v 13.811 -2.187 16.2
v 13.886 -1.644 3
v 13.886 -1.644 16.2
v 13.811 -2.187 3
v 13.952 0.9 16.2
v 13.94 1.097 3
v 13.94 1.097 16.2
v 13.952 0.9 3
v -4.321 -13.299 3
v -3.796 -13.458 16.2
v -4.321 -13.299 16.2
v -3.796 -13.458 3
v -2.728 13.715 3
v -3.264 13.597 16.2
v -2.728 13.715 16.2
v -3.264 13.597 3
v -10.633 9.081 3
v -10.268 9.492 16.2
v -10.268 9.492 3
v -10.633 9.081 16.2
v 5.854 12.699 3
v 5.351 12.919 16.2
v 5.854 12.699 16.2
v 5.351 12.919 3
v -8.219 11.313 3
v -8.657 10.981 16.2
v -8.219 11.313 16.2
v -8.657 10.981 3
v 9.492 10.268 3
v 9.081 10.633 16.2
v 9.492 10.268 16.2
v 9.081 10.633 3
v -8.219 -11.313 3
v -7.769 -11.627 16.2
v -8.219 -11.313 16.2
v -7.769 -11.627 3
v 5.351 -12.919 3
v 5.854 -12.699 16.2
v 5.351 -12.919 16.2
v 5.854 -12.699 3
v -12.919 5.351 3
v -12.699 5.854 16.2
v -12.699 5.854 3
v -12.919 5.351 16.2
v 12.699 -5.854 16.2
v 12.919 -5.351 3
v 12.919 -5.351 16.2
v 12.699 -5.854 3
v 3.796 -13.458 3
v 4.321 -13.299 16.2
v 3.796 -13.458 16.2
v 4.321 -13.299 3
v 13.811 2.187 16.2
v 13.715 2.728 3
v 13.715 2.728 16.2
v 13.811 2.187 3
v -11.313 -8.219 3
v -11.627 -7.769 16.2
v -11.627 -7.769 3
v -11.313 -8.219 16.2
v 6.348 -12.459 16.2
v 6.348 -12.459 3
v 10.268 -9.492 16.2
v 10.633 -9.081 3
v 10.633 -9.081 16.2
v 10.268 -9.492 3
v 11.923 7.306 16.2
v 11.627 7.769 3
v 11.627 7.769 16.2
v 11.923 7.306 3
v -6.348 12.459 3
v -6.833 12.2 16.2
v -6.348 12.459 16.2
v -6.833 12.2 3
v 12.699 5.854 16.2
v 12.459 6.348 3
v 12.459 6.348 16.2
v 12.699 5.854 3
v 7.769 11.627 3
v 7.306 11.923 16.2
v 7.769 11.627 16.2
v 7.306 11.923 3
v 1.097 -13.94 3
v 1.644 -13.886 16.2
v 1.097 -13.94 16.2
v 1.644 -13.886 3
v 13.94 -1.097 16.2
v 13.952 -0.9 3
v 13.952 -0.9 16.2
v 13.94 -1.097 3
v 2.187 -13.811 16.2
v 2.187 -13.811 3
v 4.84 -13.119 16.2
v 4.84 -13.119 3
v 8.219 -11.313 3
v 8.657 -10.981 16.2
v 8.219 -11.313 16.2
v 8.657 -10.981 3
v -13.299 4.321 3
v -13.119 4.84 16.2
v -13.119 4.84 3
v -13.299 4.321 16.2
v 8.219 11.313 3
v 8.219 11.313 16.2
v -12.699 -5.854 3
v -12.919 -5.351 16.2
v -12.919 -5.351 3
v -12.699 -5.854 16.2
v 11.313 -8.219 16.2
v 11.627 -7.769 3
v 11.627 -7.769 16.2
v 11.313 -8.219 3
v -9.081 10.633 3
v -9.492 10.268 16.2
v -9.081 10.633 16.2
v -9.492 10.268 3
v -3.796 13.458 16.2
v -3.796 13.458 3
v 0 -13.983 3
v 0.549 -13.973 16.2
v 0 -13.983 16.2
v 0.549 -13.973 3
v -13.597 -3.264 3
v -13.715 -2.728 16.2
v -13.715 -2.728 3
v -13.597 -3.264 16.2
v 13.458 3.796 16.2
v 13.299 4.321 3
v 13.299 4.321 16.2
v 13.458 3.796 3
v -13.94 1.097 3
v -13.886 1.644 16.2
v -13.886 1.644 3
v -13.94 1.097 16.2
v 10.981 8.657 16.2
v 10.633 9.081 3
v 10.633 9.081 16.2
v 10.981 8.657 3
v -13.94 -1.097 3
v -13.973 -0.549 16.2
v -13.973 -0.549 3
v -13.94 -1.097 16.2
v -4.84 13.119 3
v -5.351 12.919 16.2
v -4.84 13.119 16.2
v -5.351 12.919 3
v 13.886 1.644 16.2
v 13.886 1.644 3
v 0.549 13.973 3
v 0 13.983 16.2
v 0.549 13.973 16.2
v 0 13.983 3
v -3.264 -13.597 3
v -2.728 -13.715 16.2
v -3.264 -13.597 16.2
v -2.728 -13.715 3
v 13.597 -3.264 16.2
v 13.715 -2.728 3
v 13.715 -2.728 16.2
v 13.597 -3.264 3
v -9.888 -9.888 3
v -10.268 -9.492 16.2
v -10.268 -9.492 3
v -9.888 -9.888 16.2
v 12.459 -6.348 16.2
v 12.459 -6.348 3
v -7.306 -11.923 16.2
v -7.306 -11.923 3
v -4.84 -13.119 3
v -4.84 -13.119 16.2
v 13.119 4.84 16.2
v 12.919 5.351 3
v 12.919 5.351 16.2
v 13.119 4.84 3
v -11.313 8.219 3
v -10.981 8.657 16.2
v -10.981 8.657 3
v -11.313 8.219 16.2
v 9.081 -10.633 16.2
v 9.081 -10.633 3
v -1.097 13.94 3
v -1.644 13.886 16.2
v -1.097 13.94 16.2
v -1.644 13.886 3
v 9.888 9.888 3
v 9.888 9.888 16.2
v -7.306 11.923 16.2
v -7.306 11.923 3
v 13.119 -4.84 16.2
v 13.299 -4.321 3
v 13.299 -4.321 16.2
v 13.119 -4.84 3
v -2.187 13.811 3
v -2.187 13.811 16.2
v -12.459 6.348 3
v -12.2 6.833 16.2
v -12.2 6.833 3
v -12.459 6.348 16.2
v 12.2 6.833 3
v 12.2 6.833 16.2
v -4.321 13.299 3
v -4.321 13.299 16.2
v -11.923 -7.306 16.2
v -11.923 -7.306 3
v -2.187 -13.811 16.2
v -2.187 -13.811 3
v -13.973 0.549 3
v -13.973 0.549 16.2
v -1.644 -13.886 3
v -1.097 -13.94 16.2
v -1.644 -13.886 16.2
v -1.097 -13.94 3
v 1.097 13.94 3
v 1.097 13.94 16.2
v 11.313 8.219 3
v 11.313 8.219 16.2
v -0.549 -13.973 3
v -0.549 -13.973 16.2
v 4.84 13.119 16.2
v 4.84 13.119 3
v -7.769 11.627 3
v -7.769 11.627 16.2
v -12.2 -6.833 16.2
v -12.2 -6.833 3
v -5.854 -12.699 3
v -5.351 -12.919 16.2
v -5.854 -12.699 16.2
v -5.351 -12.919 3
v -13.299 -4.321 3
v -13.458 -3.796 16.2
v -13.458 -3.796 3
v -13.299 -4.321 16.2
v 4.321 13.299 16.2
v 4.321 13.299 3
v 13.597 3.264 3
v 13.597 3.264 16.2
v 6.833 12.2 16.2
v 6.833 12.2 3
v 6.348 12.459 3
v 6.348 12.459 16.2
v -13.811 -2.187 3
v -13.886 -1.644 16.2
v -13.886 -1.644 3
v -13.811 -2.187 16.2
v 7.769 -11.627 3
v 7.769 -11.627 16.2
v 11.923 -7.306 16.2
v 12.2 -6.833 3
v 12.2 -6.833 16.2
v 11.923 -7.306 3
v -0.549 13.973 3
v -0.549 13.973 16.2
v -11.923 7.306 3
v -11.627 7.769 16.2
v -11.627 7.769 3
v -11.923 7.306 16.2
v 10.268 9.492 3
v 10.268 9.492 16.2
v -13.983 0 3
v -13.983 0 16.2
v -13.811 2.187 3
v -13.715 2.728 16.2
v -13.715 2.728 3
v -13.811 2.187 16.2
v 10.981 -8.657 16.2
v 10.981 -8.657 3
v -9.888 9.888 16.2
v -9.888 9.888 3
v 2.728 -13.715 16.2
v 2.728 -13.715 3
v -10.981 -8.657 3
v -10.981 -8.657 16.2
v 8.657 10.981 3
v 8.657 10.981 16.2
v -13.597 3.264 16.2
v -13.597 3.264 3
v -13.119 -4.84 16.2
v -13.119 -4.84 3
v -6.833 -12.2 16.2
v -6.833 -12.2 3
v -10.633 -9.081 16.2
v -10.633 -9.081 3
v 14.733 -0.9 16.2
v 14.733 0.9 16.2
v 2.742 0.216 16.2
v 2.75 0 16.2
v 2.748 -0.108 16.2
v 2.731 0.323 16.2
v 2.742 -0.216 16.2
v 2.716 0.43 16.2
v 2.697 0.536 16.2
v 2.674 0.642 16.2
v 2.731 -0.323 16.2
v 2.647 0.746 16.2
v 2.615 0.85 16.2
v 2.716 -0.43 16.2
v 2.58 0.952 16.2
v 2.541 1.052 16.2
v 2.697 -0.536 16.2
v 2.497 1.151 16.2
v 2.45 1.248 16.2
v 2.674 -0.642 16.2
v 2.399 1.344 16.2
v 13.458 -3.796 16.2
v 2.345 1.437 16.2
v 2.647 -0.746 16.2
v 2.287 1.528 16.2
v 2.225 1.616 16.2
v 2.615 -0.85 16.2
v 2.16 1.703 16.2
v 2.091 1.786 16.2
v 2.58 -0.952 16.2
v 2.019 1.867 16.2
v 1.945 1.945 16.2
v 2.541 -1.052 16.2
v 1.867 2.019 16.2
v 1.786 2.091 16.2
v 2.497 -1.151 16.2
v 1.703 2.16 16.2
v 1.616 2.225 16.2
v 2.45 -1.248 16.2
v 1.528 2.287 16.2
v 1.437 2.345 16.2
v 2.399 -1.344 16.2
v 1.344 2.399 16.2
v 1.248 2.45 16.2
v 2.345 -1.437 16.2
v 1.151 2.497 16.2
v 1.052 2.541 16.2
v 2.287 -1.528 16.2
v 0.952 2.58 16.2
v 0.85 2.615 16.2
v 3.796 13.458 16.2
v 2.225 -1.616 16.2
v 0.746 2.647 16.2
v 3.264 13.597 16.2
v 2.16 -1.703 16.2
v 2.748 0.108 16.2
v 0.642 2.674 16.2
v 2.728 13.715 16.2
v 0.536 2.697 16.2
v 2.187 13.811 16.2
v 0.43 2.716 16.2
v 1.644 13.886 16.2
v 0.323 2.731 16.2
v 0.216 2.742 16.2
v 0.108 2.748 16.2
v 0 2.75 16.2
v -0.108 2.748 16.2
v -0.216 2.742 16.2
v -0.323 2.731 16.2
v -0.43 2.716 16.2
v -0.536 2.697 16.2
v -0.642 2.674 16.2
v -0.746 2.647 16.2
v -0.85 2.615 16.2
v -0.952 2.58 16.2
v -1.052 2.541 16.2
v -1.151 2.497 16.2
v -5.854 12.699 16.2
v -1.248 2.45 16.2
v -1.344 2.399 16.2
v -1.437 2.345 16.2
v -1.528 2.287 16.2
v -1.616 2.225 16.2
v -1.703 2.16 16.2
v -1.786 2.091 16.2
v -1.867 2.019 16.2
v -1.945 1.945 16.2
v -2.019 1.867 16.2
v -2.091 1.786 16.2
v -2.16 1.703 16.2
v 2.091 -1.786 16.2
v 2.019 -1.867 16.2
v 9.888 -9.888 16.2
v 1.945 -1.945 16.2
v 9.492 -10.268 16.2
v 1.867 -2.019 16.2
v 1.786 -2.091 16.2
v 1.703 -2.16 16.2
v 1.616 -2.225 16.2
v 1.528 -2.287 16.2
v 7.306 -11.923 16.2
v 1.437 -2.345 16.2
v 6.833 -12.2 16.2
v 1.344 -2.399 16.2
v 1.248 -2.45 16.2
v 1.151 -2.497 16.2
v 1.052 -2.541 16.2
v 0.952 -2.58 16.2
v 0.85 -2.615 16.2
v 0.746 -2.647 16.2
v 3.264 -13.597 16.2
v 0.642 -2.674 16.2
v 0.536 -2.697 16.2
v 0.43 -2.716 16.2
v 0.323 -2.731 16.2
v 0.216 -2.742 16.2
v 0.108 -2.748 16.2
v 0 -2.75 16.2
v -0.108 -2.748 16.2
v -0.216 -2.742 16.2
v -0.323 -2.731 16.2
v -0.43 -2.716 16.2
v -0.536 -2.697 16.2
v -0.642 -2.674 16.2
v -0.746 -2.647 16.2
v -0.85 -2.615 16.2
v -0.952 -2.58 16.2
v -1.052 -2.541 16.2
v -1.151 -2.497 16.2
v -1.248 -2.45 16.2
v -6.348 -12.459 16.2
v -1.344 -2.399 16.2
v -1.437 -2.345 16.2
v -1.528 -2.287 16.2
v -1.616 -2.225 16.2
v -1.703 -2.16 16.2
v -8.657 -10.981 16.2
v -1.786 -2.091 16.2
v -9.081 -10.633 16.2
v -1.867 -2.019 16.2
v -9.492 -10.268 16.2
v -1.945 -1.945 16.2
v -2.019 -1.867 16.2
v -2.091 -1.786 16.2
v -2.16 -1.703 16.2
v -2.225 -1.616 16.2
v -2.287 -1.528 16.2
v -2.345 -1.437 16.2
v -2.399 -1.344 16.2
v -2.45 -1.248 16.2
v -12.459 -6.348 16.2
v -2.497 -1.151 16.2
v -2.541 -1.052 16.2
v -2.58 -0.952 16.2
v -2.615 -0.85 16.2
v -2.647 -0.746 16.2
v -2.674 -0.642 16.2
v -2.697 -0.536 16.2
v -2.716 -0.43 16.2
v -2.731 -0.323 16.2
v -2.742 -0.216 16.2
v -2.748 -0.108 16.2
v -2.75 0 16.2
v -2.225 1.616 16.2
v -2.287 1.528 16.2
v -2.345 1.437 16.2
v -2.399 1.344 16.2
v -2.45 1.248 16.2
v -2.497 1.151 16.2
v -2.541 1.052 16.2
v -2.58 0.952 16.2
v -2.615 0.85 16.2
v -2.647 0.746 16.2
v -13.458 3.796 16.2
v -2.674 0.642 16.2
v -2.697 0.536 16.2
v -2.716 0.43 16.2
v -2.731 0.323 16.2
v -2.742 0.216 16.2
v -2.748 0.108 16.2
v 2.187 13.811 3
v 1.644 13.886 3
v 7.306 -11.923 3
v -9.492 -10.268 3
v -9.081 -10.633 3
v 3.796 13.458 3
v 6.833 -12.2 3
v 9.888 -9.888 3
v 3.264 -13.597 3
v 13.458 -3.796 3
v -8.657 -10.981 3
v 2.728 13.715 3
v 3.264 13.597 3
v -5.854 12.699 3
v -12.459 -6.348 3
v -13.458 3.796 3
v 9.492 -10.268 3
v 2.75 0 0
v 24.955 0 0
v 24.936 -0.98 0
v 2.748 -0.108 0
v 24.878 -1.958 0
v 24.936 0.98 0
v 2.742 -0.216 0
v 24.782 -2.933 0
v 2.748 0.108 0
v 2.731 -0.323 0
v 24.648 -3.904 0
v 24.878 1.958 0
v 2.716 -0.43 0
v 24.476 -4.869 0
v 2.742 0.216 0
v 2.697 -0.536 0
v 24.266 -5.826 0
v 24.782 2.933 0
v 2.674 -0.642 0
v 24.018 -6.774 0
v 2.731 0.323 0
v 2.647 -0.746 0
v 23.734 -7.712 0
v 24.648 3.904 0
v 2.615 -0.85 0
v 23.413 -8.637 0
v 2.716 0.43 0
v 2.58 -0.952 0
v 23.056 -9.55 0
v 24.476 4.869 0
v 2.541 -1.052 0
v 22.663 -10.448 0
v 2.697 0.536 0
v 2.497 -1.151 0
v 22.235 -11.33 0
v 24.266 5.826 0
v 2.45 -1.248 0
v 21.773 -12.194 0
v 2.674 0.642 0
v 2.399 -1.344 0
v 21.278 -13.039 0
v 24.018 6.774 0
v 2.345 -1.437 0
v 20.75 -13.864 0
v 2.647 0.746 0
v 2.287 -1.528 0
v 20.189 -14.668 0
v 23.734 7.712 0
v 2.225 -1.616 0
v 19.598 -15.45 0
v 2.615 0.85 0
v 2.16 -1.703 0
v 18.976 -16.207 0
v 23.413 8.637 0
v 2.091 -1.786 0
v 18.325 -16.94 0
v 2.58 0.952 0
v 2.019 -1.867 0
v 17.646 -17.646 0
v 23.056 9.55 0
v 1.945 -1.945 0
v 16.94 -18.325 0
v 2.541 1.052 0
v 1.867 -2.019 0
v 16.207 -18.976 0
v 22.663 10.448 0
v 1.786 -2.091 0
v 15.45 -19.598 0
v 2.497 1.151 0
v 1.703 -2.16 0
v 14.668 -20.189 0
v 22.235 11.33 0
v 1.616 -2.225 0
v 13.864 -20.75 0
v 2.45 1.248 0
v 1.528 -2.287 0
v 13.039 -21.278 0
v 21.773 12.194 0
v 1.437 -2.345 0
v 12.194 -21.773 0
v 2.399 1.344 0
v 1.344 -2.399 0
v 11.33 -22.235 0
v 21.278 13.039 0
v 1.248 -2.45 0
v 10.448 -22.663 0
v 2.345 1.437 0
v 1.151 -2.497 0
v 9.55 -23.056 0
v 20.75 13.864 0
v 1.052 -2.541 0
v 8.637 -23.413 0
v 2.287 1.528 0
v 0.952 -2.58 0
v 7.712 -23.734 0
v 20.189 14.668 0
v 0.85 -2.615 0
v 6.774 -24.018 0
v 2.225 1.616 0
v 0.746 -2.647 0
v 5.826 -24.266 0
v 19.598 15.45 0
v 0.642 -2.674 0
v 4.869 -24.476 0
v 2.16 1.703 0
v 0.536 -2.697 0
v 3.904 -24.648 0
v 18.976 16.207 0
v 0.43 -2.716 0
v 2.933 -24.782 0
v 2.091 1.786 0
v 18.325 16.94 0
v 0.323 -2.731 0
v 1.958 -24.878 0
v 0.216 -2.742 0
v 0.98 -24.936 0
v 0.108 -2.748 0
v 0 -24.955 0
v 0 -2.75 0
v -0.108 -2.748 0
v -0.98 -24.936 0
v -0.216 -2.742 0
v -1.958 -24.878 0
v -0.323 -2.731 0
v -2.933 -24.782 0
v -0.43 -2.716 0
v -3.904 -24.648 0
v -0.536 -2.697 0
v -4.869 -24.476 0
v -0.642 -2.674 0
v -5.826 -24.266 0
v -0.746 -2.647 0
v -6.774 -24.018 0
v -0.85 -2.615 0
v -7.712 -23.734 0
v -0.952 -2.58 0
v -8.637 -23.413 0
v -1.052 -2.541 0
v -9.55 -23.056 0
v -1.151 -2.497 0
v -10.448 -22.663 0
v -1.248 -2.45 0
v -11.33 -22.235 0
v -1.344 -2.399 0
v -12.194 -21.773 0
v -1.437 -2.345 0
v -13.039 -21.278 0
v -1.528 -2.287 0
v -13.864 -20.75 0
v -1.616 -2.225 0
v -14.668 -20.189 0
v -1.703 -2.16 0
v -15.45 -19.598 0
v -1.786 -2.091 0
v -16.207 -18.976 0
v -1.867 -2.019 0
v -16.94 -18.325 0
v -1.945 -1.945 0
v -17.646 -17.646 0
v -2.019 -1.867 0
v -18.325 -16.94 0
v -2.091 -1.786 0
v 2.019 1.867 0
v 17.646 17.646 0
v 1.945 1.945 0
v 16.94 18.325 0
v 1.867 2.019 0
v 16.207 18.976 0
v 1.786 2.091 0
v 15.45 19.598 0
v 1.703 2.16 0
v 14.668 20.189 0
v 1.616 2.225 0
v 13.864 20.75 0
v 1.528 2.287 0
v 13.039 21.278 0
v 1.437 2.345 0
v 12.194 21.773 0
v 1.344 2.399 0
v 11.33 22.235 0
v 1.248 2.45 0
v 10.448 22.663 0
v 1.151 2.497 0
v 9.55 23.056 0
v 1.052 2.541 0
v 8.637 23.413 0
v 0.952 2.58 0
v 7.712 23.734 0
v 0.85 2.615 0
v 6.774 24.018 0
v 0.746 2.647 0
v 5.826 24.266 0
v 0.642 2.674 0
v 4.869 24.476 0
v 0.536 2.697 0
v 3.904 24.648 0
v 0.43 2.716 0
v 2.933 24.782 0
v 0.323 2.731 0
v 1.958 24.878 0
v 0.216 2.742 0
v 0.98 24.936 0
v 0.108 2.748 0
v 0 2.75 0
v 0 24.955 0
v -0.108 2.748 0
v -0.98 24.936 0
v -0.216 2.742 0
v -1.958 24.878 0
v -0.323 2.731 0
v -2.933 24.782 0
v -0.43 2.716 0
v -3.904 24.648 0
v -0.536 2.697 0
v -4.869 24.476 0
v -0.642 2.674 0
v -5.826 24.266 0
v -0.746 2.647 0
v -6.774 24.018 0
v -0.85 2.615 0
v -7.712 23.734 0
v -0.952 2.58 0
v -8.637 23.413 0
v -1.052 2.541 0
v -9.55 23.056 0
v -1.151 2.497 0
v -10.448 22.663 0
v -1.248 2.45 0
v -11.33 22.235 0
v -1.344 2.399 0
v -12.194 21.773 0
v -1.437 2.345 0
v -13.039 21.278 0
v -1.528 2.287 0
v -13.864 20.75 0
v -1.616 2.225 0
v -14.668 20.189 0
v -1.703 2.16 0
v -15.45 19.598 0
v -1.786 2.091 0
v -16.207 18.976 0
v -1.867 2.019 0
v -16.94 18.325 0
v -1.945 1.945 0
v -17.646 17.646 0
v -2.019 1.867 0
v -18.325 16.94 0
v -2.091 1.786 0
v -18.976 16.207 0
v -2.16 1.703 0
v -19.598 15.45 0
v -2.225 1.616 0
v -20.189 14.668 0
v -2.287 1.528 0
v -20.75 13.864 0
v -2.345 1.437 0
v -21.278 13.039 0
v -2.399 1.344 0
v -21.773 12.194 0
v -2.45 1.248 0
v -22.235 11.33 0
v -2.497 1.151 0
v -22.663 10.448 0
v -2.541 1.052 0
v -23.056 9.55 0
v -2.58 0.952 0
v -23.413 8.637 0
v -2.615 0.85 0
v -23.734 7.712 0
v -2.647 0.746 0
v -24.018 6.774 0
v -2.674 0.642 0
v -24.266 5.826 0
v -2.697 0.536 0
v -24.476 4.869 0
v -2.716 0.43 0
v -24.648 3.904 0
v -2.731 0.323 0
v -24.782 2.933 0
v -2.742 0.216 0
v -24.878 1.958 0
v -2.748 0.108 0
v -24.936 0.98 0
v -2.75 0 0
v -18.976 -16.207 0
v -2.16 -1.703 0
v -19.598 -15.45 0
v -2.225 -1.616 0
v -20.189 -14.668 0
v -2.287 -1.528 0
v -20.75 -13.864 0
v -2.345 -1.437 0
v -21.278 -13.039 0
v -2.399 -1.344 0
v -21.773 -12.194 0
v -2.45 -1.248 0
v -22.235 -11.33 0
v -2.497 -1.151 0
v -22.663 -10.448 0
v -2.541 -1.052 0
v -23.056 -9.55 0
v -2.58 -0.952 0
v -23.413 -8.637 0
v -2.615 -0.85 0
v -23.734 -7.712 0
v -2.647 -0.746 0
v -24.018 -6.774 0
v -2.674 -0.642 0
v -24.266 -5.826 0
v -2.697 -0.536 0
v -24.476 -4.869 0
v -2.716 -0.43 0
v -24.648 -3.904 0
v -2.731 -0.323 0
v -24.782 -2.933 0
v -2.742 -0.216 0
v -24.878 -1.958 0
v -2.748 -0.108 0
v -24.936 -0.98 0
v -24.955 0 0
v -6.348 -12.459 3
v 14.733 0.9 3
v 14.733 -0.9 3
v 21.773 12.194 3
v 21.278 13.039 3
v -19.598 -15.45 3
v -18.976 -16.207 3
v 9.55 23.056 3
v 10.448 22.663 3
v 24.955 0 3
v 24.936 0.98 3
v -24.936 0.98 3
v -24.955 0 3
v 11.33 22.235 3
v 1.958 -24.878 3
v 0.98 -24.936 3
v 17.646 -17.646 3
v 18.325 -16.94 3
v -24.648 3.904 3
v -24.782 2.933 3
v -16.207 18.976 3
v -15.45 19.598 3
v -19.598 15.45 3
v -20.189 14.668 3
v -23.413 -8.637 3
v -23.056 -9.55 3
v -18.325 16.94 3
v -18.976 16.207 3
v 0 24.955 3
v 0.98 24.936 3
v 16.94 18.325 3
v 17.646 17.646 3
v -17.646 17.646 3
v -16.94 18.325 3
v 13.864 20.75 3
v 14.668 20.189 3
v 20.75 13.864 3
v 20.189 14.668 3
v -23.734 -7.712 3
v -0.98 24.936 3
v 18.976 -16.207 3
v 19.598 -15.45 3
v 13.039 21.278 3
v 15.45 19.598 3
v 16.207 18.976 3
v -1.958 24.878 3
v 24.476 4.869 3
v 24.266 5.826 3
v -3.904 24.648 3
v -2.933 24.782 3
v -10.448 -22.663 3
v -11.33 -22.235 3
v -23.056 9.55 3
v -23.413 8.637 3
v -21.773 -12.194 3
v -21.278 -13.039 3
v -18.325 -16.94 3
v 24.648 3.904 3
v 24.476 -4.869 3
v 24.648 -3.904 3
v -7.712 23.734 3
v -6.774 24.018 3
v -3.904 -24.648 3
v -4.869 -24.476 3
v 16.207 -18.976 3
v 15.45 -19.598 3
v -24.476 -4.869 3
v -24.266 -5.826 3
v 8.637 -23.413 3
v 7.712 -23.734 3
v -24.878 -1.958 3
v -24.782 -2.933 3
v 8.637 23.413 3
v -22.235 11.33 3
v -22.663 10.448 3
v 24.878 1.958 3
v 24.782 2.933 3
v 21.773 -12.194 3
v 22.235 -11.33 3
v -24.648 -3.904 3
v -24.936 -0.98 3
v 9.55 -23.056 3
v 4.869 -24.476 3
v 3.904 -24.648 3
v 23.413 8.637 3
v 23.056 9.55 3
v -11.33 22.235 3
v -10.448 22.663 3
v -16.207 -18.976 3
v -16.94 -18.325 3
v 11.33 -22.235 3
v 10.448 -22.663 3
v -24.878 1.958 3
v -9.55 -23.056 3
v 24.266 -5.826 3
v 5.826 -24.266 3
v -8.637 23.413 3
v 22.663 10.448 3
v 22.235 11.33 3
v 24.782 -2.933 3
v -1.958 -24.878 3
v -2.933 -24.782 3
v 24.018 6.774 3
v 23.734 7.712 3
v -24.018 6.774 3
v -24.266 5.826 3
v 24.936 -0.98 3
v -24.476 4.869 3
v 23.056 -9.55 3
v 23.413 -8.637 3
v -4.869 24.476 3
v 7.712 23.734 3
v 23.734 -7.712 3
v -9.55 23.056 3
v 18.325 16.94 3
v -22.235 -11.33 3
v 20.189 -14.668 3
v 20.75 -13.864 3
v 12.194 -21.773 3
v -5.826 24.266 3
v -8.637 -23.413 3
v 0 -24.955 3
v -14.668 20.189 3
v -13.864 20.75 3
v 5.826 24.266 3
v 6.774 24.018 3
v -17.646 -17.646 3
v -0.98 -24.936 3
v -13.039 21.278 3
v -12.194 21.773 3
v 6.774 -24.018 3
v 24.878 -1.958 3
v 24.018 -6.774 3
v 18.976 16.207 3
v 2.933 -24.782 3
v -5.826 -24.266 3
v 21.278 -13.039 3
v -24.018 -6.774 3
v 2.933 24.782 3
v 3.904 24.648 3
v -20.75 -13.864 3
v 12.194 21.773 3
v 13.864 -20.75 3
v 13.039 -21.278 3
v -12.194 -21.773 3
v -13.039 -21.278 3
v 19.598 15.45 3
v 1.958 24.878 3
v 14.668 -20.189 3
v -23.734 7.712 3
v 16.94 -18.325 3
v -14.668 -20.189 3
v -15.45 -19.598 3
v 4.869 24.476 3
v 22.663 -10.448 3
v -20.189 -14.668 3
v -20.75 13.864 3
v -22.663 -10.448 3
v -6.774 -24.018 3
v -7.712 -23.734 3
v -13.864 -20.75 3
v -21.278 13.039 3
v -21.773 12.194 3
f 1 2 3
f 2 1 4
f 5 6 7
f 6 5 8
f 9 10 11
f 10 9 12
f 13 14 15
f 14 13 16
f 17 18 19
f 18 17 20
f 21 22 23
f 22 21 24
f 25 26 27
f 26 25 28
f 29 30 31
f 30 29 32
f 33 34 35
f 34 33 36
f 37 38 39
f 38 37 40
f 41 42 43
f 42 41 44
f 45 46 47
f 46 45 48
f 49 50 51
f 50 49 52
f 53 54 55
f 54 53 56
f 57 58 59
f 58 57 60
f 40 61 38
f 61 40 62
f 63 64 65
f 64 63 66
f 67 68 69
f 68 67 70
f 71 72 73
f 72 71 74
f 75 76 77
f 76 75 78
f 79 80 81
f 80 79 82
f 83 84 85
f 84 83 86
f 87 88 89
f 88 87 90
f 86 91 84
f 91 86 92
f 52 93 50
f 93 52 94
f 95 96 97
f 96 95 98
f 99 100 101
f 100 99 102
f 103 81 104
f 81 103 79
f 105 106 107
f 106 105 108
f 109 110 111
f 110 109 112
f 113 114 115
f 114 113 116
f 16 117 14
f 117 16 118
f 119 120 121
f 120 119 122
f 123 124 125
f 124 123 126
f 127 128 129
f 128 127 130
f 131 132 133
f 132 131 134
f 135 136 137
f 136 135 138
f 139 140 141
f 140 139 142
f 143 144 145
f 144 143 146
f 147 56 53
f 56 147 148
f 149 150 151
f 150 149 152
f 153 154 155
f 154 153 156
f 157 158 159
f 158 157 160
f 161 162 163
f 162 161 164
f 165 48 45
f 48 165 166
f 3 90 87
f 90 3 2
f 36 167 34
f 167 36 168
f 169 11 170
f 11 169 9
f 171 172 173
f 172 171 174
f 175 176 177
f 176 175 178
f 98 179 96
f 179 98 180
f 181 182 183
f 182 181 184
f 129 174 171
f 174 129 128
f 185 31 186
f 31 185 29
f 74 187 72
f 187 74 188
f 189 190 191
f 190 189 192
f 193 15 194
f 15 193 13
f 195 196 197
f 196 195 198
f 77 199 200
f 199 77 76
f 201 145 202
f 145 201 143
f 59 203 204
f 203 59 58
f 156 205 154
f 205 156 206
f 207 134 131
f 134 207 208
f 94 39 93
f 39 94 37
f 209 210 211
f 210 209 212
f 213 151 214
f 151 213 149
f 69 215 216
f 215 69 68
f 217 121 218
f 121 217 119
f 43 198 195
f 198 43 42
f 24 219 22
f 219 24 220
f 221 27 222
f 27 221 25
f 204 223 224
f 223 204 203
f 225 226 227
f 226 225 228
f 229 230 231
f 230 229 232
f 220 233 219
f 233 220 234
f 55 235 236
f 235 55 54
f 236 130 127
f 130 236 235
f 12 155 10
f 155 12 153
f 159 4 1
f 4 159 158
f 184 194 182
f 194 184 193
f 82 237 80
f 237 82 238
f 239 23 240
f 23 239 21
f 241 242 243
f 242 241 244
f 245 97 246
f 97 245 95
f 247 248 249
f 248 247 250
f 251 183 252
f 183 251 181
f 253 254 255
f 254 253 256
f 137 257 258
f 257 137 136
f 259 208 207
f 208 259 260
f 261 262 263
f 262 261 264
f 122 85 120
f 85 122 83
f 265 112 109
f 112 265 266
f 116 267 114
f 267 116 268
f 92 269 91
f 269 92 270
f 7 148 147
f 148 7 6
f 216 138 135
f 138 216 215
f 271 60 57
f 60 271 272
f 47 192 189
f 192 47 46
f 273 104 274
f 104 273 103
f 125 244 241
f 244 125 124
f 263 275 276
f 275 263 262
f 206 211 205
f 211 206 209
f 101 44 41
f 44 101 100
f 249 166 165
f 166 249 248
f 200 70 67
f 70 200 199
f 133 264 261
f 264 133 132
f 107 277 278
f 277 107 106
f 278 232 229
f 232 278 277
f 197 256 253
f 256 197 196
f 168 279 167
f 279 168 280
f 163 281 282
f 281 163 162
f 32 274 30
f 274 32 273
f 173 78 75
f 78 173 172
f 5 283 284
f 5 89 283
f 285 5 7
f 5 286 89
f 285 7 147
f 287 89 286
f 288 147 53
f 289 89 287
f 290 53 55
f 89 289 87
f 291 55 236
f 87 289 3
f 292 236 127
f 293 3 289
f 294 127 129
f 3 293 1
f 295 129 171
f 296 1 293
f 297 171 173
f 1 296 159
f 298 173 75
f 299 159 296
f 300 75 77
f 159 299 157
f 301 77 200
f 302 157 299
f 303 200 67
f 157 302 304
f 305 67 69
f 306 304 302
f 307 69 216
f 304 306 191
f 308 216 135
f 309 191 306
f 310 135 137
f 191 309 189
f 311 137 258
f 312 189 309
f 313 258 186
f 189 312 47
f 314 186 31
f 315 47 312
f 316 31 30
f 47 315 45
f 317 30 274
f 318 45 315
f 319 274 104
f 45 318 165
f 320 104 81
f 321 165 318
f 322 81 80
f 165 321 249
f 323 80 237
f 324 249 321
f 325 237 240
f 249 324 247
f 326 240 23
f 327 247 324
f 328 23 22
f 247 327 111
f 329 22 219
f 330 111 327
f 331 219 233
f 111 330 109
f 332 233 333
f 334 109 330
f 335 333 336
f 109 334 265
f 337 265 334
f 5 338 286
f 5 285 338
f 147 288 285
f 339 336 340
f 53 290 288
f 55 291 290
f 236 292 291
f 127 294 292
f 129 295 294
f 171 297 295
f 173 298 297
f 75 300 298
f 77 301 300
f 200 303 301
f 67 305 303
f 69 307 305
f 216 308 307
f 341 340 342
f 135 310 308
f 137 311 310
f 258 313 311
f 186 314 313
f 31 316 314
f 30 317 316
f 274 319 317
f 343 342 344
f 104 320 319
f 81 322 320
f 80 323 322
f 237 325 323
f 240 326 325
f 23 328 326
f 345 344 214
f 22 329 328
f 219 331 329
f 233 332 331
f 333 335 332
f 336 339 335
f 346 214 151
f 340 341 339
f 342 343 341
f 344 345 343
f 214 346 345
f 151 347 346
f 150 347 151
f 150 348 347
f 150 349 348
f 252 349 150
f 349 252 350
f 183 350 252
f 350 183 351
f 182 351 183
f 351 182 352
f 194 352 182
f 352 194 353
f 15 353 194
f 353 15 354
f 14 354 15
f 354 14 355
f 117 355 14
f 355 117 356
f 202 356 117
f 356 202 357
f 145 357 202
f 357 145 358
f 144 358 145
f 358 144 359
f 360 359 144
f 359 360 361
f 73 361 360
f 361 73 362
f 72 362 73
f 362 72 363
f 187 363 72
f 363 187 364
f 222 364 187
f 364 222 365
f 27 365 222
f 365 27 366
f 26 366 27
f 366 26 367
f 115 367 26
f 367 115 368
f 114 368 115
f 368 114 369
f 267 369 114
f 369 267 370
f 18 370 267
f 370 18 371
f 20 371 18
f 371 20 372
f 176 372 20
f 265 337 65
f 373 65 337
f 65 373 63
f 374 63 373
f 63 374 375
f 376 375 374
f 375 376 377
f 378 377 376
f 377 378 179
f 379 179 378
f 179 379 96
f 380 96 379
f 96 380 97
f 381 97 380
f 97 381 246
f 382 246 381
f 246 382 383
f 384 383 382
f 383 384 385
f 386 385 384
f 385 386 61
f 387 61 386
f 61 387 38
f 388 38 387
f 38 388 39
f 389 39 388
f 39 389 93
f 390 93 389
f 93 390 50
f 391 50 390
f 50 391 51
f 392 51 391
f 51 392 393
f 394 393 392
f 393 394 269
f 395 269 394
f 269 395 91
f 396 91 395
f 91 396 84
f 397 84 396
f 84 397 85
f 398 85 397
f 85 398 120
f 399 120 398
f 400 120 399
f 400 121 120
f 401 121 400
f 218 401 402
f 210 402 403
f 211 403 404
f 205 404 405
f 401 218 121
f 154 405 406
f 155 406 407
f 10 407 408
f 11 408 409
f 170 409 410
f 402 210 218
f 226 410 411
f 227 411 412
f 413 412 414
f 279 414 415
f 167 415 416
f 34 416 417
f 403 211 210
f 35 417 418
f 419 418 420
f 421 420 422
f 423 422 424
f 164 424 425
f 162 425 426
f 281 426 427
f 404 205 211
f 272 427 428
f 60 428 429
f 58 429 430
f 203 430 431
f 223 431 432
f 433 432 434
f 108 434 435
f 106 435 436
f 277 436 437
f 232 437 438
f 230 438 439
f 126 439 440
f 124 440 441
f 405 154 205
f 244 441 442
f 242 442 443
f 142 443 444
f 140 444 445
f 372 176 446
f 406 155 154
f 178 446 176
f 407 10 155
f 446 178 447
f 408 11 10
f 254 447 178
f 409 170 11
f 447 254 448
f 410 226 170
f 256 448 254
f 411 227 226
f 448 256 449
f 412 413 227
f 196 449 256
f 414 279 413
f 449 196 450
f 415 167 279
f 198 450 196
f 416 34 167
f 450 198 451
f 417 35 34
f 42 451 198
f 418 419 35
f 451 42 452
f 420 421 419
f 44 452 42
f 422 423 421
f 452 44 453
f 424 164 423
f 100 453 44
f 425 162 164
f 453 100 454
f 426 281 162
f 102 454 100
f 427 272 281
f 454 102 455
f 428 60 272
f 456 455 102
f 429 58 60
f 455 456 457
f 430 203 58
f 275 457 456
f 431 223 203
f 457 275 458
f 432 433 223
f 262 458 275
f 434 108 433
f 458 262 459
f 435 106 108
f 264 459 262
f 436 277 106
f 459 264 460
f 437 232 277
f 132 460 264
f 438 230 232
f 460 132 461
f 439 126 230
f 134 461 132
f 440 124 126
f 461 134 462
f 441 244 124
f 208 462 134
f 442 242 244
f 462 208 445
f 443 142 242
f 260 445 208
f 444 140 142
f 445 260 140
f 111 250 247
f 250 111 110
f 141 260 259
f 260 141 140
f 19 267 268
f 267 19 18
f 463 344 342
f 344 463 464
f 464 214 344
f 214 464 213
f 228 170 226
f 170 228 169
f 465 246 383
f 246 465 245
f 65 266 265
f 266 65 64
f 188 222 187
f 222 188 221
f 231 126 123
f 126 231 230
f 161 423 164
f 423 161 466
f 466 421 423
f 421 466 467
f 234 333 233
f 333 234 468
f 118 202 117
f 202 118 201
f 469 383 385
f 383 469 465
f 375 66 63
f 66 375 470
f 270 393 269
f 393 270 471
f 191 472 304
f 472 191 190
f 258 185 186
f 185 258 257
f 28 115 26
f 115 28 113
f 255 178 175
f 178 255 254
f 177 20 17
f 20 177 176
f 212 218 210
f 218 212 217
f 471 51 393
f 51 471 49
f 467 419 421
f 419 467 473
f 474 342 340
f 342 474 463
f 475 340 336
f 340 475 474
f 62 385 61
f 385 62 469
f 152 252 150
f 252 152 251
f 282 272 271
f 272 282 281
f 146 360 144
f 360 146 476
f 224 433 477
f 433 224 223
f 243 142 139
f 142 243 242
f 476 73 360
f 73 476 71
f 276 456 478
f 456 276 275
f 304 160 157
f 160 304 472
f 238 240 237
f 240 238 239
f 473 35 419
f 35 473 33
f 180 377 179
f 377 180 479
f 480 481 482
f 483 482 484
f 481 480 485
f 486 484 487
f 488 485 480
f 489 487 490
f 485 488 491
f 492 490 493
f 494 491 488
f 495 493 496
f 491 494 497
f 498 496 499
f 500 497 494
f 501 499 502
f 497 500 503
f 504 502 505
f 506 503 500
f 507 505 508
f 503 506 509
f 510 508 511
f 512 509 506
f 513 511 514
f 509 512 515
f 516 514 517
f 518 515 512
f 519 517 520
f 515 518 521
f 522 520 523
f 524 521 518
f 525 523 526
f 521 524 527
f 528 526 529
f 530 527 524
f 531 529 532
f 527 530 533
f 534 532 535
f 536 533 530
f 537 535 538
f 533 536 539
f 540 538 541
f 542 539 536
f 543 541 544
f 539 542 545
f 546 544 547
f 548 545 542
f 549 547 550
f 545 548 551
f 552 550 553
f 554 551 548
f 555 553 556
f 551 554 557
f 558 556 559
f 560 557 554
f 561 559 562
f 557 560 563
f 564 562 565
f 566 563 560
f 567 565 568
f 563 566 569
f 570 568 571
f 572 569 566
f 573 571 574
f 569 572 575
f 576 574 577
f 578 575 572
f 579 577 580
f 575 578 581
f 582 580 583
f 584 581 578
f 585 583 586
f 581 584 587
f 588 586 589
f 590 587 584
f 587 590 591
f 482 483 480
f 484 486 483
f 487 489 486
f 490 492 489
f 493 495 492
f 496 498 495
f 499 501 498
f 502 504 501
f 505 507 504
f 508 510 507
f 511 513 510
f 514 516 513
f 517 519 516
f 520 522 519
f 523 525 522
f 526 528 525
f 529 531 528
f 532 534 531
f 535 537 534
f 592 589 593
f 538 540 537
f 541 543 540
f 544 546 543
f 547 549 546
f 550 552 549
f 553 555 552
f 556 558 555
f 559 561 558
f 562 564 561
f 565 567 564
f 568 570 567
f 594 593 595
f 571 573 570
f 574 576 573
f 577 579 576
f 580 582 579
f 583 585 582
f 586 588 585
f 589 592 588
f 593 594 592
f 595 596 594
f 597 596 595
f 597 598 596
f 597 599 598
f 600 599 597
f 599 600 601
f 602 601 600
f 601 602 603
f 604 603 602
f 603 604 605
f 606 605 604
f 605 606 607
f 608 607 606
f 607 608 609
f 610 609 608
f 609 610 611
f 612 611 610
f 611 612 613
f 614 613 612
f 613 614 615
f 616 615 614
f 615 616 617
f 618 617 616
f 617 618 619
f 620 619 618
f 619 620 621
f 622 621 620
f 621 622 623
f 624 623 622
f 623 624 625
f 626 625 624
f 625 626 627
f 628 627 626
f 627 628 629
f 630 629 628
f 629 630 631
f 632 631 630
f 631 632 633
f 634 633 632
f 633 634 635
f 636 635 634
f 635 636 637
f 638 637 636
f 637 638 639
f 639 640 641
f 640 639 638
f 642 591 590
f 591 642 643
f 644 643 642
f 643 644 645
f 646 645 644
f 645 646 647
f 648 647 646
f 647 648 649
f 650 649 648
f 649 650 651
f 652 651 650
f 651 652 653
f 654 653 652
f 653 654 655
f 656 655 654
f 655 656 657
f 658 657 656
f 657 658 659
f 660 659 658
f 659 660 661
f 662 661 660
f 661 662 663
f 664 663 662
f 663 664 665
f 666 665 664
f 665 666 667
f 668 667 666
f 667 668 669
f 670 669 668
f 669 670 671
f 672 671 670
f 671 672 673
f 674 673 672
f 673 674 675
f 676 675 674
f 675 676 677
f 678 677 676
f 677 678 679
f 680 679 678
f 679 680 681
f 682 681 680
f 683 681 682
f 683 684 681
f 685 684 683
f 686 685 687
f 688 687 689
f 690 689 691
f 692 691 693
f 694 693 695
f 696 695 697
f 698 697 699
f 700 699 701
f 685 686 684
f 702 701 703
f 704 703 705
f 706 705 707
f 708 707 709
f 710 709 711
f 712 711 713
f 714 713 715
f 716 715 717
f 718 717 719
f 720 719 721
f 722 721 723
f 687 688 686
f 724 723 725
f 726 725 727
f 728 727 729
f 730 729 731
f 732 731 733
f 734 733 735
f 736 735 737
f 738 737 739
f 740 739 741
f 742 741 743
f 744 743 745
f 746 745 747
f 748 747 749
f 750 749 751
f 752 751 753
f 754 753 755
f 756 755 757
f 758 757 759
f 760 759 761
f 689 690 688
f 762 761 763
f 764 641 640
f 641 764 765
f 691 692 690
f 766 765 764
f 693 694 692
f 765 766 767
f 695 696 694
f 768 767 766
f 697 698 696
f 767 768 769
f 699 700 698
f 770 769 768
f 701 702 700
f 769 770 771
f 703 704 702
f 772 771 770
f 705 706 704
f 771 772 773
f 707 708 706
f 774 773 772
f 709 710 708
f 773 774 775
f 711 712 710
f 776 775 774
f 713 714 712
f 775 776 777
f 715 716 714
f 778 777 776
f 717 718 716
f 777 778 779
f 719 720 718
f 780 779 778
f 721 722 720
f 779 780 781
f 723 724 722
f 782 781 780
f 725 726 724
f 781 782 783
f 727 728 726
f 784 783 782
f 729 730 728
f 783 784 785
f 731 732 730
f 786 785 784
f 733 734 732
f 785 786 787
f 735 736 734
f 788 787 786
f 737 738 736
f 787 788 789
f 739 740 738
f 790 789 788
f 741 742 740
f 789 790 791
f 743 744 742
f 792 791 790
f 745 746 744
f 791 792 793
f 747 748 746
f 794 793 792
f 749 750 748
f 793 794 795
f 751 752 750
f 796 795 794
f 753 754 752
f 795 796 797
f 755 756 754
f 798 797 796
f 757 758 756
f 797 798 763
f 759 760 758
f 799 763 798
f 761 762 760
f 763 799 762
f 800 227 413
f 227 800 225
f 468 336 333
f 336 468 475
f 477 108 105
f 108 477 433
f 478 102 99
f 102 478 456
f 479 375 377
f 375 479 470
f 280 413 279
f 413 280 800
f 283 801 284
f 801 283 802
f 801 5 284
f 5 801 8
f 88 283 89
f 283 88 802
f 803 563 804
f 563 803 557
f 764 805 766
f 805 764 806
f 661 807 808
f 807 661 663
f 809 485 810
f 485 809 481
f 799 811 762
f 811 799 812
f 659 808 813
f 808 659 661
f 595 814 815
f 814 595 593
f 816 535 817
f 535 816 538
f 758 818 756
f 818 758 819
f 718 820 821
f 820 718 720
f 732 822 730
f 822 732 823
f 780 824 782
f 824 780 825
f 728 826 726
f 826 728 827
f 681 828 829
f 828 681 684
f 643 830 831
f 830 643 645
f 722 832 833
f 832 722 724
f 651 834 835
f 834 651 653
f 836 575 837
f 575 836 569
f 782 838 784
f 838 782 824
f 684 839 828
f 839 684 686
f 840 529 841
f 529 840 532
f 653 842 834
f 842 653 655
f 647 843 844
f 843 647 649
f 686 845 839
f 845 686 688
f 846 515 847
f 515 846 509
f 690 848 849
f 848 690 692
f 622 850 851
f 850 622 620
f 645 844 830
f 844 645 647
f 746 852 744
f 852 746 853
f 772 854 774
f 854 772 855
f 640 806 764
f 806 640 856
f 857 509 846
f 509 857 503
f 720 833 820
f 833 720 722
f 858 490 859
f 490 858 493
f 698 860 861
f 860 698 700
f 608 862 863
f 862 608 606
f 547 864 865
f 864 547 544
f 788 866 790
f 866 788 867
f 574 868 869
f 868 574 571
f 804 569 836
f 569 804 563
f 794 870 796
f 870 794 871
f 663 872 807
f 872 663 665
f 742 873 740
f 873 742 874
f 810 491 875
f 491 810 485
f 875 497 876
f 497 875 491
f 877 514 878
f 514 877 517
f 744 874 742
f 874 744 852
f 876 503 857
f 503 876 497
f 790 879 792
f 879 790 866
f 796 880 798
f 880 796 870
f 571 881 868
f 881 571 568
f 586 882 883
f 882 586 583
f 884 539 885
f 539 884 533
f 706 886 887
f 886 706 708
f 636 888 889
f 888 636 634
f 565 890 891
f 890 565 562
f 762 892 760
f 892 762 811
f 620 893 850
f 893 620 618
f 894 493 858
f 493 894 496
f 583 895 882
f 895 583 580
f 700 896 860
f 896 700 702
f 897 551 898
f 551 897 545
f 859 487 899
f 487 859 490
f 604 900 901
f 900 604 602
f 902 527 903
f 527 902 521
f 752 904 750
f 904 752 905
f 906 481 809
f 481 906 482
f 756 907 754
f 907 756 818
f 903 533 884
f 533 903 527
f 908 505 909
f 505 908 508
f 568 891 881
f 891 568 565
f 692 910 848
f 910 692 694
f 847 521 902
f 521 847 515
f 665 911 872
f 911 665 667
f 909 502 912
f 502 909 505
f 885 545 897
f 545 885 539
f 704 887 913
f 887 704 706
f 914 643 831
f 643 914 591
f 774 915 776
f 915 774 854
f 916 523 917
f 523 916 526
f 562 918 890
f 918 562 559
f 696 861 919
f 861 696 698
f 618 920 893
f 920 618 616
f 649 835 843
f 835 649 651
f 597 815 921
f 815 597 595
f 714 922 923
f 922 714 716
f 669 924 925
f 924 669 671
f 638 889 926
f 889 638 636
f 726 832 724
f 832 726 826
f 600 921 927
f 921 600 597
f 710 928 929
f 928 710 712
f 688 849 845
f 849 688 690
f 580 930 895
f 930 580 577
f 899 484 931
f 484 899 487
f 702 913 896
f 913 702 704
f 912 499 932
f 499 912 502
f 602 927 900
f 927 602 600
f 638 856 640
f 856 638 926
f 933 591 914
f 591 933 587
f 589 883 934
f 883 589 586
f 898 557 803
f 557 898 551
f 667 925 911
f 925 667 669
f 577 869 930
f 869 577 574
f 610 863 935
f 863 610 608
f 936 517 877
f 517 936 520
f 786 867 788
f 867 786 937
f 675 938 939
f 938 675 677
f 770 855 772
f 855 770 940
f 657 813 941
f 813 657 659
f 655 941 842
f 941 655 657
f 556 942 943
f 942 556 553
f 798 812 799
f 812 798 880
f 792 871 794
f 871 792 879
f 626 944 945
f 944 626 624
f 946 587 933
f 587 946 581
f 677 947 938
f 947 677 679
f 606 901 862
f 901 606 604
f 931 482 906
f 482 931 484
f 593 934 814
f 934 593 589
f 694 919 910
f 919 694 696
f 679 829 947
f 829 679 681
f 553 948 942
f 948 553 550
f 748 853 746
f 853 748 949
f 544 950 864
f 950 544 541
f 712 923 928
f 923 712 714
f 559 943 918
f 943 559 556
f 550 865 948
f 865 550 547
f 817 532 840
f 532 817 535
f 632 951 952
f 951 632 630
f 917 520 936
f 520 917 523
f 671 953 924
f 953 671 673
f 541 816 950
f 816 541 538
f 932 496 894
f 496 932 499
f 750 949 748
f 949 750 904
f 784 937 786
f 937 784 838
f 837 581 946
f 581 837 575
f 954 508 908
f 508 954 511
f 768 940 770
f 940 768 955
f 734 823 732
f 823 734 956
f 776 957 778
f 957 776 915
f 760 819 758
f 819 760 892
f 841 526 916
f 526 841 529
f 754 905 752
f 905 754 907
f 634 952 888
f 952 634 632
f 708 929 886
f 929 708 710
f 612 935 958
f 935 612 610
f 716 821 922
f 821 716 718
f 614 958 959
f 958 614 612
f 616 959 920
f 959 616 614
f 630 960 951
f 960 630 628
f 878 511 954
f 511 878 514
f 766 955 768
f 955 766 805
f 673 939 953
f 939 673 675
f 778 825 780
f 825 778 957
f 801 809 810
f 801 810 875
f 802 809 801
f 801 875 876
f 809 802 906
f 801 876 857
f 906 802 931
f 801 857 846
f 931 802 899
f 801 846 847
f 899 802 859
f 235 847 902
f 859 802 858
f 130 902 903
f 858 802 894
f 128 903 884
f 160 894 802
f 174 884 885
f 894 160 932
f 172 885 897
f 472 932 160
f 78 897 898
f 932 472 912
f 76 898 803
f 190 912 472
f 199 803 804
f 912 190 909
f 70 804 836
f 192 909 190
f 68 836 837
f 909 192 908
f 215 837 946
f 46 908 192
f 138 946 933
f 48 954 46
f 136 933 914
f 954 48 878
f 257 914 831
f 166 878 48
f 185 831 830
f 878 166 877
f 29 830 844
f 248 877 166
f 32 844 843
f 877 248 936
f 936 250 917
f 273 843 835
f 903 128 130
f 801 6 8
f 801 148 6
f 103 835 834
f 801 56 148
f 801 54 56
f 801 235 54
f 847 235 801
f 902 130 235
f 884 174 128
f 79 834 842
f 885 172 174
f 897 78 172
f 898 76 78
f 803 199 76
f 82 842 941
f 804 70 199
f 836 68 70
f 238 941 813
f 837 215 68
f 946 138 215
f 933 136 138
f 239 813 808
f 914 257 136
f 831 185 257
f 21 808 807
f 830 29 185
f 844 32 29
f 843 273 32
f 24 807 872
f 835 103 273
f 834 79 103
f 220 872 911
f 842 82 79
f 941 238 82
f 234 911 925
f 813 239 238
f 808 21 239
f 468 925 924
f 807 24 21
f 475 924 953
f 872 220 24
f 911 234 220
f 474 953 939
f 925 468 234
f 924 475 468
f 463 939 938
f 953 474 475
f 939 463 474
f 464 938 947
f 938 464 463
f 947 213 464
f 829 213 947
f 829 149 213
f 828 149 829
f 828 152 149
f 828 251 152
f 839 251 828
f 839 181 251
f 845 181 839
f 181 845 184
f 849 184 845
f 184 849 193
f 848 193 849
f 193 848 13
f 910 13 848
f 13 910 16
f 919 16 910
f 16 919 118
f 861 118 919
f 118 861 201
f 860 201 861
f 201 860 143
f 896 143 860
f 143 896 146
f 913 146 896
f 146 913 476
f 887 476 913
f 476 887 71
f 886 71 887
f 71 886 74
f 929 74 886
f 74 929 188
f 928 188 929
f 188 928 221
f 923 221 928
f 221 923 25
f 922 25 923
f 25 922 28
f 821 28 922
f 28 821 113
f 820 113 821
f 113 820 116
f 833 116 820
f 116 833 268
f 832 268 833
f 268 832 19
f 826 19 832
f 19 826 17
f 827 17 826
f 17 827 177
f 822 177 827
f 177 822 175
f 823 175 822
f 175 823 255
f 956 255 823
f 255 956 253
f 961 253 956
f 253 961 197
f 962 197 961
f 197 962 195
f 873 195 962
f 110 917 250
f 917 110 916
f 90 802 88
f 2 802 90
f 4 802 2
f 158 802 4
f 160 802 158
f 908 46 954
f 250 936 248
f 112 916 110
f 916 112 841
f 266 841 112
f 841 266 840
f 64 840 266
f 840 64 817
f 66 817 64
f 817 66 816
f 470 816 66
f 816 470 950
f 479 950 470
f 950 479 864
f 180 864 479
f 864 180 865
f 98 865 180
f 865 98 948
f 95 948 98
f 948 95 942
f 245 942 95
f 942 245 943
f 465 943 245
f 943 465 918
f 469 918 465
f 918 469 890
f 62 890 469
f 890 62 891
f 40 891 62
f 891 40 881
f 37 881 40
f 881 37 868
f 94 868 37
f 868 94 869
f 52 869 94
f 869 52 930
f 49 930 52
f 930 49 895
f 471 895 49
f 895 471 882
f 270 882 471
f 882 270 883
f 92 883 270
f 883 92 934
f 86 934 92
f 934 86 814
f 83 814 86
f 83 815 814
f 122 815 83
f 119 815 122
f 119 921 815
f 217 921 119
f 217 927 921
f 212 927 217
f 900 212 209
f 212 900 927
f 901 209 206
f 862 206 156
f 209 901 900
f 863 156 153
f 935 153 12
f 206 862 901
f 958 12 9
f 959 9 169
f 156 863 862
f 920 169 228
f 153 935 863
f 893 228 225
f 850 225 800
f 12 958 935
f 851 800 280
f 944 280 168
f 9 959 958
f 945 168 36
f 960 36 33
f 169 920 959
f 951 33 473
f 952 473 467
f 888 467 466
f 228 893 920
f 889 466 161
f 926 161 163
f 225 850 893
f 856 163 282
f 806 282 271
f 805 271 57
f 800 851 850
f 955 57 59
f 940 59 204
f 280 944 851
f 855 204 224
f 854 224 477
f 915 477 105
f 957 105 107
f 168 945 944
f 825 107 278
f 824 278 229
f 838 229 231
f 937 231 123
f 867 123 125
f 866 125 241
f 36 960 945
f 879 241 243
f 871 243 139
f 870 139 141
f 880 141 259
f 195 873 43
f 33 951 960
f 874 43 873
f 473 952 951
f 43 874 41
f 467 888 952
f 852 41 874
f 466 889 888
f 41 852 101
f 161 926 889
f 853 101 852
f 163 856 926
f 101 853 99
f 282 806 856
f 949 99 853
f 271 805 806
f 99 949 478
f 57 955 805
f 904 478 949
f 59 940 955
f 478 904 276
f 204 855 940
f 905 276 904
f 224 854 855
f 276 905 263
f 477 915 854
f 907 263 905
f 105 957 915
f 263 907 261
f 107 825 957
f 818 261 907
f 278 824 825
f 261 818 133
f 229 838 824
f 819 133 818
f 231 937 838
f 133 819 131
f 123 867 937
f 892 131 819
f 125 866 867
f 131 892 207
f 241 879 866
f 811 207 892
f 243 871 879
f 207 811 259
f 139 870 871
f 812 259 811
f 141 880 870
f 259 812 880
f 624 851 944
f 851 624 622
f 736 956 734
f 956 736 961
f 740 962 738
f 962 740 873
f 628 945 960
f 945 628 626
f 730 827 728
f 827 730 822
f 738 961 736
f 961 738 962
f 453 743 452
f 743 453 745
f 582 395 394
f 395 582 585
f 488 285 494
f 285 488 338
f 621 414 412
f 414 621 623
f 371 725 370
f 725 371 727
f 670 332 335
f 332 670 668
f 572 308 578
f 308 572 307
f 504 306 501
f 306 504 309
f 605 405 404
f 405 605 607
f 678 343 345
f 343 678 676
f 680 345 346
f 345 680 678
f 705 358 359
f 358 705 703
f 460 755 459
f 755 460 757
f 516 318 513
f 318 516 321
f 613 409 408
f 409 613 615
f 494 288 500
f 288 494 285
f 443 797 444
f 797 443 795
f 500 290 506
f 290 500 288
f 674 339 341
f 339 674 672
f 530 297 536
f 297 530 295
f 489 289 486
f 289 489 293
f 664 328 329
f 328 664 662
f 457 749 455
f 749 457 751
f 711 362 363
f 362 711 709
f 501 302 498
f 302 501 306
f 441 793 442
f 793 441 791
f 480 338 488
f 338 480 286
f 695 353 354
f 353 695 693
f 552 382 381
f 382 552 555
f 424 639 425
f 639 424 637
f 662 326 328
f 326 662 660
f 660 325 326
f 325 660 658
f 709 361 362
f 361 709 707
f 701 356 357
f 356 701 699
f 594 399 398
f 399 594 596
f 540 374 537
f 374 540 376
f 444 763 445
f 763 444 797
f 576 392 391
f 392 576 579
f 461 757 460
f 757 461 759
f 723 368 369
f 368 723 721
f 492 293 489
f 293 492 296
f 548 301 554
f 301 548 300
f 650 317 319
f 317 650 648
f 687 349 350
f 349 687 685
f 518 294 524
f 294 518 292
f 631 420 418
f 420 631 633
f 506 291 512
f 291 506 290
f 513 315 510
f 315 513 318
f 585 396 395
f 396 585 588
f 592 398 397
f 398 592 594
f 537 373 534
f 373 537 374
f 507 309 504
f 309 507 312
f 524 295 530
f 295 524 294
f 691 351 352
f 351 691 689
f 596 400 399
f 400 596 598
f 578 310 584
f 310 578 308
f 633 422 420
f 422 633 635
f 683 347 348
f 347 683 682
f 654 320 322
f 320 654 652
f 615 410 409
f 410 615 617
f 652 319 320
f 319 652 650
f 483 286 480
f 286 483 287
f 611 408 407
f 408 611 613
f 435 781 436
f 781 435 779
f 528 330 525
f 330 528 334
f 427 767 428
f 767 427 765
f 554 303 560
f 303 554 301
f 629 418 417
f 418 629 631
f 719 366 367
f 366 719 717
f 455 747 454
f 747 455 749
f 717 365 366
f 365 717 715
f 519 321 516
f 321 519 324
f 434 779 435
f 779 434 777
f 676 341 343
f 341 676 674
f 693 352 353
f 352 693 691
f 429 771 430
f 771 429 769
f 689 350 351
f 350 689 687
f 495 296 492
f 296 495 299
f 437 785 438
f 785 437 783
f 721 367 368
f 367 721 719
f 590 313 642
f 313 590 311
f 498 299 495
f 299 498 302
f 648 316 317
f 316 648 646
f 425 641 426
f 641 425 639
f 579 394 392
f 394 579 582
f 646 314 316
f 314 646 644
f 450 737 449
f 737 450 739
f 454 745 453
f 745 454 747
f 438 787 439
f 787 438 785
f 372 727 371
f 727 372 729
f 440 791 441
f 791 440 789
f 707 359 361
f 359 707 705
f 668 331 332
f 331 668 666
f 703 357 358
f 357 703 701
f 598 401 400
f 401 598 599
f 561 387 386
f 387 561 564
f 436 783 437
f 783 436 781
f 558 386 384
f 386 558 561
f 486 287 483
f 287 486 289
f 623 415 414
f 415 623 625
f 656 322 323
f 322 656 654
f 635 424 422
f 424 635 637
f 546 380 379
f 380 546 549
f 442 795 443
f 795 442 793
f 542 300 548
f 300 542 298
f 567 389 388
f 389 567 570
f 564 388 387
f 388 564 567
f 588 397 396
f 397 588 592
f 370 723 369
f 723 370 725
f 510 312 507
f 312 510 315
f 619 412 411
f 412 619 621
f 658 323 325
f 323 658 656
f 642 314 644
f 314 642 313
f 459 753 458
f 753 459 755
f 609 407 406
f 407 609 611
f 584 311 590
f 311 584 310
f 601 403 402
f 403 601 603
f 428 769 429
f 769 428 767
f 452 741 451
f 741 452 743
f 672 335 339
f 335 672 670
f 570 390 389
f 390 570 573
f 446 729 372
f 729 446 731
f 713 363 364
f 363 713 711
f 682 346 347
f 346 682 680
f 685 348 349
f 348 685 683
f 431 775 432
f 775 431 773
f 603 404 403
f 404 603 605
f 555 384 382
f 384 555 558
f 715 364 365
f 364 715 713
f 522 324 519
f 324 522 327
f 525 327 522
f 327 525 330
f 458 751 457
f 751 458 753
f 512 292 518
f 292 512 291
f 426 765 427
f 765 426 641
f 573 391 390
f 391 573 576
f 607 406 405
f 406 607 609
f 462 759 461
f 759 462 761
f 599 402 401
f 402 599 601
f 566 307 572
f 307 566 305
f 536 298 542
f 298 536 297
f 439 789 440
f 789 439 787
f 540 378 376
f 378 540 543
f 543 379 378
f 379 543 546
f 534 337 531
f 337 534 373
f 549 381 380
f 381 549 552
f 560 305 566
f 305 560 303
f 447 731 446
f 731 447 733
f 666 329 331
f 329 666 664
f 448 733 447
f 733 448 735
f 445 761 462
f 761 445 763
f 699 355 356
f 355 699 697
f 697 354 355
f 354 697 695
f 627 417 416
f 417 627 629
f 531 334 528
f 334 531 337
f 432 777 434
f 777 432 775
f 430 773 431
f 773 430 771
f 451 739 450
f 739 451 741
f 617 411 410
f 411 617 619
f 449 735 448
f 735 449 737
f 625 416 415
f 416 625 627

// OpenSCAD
// file: motor_lib.scad
// Biblioteca del motor DronSwarm (M6). Las medidas vienen de <dron>_motor_params.scad (generado). Unidades: mm.
// Sin hull/minkowski (CLAUDE.md): todo con cilindros, polígonos y extrusiones.
$fn = 160;

// ---------- láser ----------
module stator_lamination_2d() {           // lámina del estator: 0.2 mm de acero al silicio (NO20)
    difference() {
        circle(r = r_s);
        circle(r = r_bore);
        for (s = slots) polygon(s);
        translate([r_bore - 0.01, -1.0]) square([1.2, 2.0]);                 // chaveta: alinea las láminas y fija al tubo
    }
}
module rotor_ring_2d() {                  // anillo del rotor: acero común 1 mm, se apilan n_ring
    difference() {
        circle(r = r_out);
        circle(r = r_mag_out + fit_slide / 2);
        translate([r_mag_out, -0.75]) square([0.8, 1.5]);                     // marca de orientación (polo 1)
    }
}

// ---------- impresas ----------
module cap() {                            // tapa: lleva la hélice y el eje; el anillo del rotor entra 2 mm en la ranura
    hub_r = shaft / 2 + 3.5;
    difference() {
        union() {
            cylinder(r = r_out + 1.2, h = cap_t);
            translate([0, 0, -2]) difference() {                                 // pollera que abraza el anillo
                cylinder(r = r_out + 1.2, h = 2);
                translate([0, 0, -0.1]) cylinder(r = r_out + print_clear / 2, h = 2.2);
            }
            cylinder(r = hub_r, h = cap_t + 4);                                  // cubo del eje
        }
        translate([0, 0, -1]) cylinder(d = shaft + fit_press, h = cap_t + 6);   // eje a presión
        translate([0, 0, cap_t + 2]) rotate([0, 90, 0]) cylinder(d = 2.6, h = hub_r + 1);   // prisionero M3
        for (i = [0 : prop_n - 1]) rotate(360 / prop_n * i + 45)
            translate([prop_pcd / 2, 0, -1]) cylinder(d = prop_bolt, h = cap_t + 6);
        for (i = [0 : prop_n - 1]) rotate(360 / prop_n * i)                      // ventilación entre los tornillos de la hélice
            translate([0, 0, -1]) linear_extrude(cap_t + 2)
                polygon([[ (hub_r + 2) * cos(-14), (hub_r + 2) * sin(-14)], [ (r_mag_in - 3) * cos(-18), (r_mag_in - 3) * sin(-18)],
                         [ (r_mag_in - 3) * cos(18), (r_mag_in - 3) * sin(18)], [ (hub_r + 2) * cos(14), (hub_r + 2) * sin(14)]]);
    }
}

module base() {                           // base: tubo con los 2 rodamientos, sostiene el estator, se atornilla al DMI
    tube_h = l_stack + 2 * overhang + 1;
    difference() {
        union() {
            cylinder(r = max(r_bore + 5, dmi_pcd / 2 + 4), h = base_t);
            cylinder(r = r_bore + fit_press / 2, h = base_t + tube_h);               // el estator se pega sobre el tubo
            translate([r_bore - 0.2, -0.9, base_t]) cube([1.0, 1.8, tube_h]);        // chaveta (entra en la muesca de las láminas)
        }
        translate([0, 0, -1]) cylinder(d = bearing_od + fit_press, h = bearing_w + 1);                  // rodamiento inferior
        translate([0, 0, base_t + tube_h - bearing_w]) cylinder(d = bearing_od + fit_press, h = bearing_w + 1); // superior
        translate([0, 0, -1]) cylinder(d = shaft + 1.0, h = base_t + tube_h + 2);
        for (i = [0 : dmi_n - 1]) rotate(360 / dmi_n * i + 45) translate([dmi_pcd / 2, 0, -1]) cylinder(d = dmi_bolt, h = base_t + 2);
        translate([r_bore - 4, -2, -1]) cube([6, 4, base_t + 2]);                 // salida de los 3 cables de fase
    }
}

module magnet_jig() {                     // peine: se mete dentro del anillo y deja cada imán en su lugar (paso de polo exacto)
    rib = 2 * PI * r_mag_in / poles - magnet_w;      // espacio entre imanes en el diámetro interior
    difference() {
        union() {
            cylinder(r = r_mag_in - 0.15, h = l_stack + 4);
            for (i = [0 : poles - 1]) rotate(360 / poles * (i + 0.5))
                translate([r_mag_in - 0.5, -max(rib, 0.6) / 2, 0]) cube([h_magnet + 0.3, max(rib, 0.6) - 0.15, l_stack + 4]);
        }
        translate([0, 0, -1]) cylinder(r = r_mag_in - 3, h = l_stack + 6);
    }
}

module stack_mandrel() {                  // mandril de apilado: alinea las láminas por el agujero y la chaveta mientras cura el adhesivo
    difference() {
        union() {
            cylinder(r = r_bore - 0.05, h = l_stack + 10);
            translate([r_bore - 0.3, -0.9, 0]) cube([1.0, 1.8, l_stack + 10]);
            cylinder(r = r_s + 3, h = 3);
        }
        translate([0, 0, -1]) cylinder(d = 5.5, h = l_stack + 12);                // varilla roscada M5 para prensar
    }
}

module winding_holder() {                 // soporte para bobinar a mano: sujeta el estator por el agujero, con mango
    union() {
        cylinder(r = r_bore - 0.1, h = l_stack + 2);
        translate([r_bore - 0.4, -0.85, 0]) cube([1.0, 1.7, l_stack + 2]);
        translate([0, 0, -40]) cylinder(r = 7, h = 40);
    }
}

// ---------- ensamble (para ver) ----------
module assembly() {
    color("#b0b0b0") translate([0, 0, base_t + overhang]) linear_extrude(l_stack) stator_lamination_2d();
    color("#b87333") for (s = slots) translate([0, 0, base_t + 0.5]) linear_extrude(l_stack + 2 * overhang - 1) offset(r = -0.35) polygon(s);
    color("#4a4a4a") translate([0, 0, base_t + overhang - 1]) linear_extrude(l_stack + 2) rotor_ring_2d();
    color("#2a78d6") for (i = [0 : poles - 1]) rotate(360 / poles * i)
        translate([0, 0, base_t + overhang]) rotate_extrude(angle = 360 / poles * pole_arc)
            translate([r_mag_in, 0]) square([h_magnet, l_stack]);
    color("#eb6834") translate([0, 0, base_t + 2 * overhang + l_stack + 1]) cap();
    color("#eb6834", 0.9) base();
    color("#dddddd") translate([0, 0, -6]) cylinder(d = shaft, h = base_t + 2 * overhang + l_stack + cap_t + 14);
}
// main file
// DS-I · mandril_apilado (M6). Generado por motor/fabricacion/gen_cad.py
include <ds_i_motor_params.scad>
include <motor_lib.scad>
stack_mandrel();
